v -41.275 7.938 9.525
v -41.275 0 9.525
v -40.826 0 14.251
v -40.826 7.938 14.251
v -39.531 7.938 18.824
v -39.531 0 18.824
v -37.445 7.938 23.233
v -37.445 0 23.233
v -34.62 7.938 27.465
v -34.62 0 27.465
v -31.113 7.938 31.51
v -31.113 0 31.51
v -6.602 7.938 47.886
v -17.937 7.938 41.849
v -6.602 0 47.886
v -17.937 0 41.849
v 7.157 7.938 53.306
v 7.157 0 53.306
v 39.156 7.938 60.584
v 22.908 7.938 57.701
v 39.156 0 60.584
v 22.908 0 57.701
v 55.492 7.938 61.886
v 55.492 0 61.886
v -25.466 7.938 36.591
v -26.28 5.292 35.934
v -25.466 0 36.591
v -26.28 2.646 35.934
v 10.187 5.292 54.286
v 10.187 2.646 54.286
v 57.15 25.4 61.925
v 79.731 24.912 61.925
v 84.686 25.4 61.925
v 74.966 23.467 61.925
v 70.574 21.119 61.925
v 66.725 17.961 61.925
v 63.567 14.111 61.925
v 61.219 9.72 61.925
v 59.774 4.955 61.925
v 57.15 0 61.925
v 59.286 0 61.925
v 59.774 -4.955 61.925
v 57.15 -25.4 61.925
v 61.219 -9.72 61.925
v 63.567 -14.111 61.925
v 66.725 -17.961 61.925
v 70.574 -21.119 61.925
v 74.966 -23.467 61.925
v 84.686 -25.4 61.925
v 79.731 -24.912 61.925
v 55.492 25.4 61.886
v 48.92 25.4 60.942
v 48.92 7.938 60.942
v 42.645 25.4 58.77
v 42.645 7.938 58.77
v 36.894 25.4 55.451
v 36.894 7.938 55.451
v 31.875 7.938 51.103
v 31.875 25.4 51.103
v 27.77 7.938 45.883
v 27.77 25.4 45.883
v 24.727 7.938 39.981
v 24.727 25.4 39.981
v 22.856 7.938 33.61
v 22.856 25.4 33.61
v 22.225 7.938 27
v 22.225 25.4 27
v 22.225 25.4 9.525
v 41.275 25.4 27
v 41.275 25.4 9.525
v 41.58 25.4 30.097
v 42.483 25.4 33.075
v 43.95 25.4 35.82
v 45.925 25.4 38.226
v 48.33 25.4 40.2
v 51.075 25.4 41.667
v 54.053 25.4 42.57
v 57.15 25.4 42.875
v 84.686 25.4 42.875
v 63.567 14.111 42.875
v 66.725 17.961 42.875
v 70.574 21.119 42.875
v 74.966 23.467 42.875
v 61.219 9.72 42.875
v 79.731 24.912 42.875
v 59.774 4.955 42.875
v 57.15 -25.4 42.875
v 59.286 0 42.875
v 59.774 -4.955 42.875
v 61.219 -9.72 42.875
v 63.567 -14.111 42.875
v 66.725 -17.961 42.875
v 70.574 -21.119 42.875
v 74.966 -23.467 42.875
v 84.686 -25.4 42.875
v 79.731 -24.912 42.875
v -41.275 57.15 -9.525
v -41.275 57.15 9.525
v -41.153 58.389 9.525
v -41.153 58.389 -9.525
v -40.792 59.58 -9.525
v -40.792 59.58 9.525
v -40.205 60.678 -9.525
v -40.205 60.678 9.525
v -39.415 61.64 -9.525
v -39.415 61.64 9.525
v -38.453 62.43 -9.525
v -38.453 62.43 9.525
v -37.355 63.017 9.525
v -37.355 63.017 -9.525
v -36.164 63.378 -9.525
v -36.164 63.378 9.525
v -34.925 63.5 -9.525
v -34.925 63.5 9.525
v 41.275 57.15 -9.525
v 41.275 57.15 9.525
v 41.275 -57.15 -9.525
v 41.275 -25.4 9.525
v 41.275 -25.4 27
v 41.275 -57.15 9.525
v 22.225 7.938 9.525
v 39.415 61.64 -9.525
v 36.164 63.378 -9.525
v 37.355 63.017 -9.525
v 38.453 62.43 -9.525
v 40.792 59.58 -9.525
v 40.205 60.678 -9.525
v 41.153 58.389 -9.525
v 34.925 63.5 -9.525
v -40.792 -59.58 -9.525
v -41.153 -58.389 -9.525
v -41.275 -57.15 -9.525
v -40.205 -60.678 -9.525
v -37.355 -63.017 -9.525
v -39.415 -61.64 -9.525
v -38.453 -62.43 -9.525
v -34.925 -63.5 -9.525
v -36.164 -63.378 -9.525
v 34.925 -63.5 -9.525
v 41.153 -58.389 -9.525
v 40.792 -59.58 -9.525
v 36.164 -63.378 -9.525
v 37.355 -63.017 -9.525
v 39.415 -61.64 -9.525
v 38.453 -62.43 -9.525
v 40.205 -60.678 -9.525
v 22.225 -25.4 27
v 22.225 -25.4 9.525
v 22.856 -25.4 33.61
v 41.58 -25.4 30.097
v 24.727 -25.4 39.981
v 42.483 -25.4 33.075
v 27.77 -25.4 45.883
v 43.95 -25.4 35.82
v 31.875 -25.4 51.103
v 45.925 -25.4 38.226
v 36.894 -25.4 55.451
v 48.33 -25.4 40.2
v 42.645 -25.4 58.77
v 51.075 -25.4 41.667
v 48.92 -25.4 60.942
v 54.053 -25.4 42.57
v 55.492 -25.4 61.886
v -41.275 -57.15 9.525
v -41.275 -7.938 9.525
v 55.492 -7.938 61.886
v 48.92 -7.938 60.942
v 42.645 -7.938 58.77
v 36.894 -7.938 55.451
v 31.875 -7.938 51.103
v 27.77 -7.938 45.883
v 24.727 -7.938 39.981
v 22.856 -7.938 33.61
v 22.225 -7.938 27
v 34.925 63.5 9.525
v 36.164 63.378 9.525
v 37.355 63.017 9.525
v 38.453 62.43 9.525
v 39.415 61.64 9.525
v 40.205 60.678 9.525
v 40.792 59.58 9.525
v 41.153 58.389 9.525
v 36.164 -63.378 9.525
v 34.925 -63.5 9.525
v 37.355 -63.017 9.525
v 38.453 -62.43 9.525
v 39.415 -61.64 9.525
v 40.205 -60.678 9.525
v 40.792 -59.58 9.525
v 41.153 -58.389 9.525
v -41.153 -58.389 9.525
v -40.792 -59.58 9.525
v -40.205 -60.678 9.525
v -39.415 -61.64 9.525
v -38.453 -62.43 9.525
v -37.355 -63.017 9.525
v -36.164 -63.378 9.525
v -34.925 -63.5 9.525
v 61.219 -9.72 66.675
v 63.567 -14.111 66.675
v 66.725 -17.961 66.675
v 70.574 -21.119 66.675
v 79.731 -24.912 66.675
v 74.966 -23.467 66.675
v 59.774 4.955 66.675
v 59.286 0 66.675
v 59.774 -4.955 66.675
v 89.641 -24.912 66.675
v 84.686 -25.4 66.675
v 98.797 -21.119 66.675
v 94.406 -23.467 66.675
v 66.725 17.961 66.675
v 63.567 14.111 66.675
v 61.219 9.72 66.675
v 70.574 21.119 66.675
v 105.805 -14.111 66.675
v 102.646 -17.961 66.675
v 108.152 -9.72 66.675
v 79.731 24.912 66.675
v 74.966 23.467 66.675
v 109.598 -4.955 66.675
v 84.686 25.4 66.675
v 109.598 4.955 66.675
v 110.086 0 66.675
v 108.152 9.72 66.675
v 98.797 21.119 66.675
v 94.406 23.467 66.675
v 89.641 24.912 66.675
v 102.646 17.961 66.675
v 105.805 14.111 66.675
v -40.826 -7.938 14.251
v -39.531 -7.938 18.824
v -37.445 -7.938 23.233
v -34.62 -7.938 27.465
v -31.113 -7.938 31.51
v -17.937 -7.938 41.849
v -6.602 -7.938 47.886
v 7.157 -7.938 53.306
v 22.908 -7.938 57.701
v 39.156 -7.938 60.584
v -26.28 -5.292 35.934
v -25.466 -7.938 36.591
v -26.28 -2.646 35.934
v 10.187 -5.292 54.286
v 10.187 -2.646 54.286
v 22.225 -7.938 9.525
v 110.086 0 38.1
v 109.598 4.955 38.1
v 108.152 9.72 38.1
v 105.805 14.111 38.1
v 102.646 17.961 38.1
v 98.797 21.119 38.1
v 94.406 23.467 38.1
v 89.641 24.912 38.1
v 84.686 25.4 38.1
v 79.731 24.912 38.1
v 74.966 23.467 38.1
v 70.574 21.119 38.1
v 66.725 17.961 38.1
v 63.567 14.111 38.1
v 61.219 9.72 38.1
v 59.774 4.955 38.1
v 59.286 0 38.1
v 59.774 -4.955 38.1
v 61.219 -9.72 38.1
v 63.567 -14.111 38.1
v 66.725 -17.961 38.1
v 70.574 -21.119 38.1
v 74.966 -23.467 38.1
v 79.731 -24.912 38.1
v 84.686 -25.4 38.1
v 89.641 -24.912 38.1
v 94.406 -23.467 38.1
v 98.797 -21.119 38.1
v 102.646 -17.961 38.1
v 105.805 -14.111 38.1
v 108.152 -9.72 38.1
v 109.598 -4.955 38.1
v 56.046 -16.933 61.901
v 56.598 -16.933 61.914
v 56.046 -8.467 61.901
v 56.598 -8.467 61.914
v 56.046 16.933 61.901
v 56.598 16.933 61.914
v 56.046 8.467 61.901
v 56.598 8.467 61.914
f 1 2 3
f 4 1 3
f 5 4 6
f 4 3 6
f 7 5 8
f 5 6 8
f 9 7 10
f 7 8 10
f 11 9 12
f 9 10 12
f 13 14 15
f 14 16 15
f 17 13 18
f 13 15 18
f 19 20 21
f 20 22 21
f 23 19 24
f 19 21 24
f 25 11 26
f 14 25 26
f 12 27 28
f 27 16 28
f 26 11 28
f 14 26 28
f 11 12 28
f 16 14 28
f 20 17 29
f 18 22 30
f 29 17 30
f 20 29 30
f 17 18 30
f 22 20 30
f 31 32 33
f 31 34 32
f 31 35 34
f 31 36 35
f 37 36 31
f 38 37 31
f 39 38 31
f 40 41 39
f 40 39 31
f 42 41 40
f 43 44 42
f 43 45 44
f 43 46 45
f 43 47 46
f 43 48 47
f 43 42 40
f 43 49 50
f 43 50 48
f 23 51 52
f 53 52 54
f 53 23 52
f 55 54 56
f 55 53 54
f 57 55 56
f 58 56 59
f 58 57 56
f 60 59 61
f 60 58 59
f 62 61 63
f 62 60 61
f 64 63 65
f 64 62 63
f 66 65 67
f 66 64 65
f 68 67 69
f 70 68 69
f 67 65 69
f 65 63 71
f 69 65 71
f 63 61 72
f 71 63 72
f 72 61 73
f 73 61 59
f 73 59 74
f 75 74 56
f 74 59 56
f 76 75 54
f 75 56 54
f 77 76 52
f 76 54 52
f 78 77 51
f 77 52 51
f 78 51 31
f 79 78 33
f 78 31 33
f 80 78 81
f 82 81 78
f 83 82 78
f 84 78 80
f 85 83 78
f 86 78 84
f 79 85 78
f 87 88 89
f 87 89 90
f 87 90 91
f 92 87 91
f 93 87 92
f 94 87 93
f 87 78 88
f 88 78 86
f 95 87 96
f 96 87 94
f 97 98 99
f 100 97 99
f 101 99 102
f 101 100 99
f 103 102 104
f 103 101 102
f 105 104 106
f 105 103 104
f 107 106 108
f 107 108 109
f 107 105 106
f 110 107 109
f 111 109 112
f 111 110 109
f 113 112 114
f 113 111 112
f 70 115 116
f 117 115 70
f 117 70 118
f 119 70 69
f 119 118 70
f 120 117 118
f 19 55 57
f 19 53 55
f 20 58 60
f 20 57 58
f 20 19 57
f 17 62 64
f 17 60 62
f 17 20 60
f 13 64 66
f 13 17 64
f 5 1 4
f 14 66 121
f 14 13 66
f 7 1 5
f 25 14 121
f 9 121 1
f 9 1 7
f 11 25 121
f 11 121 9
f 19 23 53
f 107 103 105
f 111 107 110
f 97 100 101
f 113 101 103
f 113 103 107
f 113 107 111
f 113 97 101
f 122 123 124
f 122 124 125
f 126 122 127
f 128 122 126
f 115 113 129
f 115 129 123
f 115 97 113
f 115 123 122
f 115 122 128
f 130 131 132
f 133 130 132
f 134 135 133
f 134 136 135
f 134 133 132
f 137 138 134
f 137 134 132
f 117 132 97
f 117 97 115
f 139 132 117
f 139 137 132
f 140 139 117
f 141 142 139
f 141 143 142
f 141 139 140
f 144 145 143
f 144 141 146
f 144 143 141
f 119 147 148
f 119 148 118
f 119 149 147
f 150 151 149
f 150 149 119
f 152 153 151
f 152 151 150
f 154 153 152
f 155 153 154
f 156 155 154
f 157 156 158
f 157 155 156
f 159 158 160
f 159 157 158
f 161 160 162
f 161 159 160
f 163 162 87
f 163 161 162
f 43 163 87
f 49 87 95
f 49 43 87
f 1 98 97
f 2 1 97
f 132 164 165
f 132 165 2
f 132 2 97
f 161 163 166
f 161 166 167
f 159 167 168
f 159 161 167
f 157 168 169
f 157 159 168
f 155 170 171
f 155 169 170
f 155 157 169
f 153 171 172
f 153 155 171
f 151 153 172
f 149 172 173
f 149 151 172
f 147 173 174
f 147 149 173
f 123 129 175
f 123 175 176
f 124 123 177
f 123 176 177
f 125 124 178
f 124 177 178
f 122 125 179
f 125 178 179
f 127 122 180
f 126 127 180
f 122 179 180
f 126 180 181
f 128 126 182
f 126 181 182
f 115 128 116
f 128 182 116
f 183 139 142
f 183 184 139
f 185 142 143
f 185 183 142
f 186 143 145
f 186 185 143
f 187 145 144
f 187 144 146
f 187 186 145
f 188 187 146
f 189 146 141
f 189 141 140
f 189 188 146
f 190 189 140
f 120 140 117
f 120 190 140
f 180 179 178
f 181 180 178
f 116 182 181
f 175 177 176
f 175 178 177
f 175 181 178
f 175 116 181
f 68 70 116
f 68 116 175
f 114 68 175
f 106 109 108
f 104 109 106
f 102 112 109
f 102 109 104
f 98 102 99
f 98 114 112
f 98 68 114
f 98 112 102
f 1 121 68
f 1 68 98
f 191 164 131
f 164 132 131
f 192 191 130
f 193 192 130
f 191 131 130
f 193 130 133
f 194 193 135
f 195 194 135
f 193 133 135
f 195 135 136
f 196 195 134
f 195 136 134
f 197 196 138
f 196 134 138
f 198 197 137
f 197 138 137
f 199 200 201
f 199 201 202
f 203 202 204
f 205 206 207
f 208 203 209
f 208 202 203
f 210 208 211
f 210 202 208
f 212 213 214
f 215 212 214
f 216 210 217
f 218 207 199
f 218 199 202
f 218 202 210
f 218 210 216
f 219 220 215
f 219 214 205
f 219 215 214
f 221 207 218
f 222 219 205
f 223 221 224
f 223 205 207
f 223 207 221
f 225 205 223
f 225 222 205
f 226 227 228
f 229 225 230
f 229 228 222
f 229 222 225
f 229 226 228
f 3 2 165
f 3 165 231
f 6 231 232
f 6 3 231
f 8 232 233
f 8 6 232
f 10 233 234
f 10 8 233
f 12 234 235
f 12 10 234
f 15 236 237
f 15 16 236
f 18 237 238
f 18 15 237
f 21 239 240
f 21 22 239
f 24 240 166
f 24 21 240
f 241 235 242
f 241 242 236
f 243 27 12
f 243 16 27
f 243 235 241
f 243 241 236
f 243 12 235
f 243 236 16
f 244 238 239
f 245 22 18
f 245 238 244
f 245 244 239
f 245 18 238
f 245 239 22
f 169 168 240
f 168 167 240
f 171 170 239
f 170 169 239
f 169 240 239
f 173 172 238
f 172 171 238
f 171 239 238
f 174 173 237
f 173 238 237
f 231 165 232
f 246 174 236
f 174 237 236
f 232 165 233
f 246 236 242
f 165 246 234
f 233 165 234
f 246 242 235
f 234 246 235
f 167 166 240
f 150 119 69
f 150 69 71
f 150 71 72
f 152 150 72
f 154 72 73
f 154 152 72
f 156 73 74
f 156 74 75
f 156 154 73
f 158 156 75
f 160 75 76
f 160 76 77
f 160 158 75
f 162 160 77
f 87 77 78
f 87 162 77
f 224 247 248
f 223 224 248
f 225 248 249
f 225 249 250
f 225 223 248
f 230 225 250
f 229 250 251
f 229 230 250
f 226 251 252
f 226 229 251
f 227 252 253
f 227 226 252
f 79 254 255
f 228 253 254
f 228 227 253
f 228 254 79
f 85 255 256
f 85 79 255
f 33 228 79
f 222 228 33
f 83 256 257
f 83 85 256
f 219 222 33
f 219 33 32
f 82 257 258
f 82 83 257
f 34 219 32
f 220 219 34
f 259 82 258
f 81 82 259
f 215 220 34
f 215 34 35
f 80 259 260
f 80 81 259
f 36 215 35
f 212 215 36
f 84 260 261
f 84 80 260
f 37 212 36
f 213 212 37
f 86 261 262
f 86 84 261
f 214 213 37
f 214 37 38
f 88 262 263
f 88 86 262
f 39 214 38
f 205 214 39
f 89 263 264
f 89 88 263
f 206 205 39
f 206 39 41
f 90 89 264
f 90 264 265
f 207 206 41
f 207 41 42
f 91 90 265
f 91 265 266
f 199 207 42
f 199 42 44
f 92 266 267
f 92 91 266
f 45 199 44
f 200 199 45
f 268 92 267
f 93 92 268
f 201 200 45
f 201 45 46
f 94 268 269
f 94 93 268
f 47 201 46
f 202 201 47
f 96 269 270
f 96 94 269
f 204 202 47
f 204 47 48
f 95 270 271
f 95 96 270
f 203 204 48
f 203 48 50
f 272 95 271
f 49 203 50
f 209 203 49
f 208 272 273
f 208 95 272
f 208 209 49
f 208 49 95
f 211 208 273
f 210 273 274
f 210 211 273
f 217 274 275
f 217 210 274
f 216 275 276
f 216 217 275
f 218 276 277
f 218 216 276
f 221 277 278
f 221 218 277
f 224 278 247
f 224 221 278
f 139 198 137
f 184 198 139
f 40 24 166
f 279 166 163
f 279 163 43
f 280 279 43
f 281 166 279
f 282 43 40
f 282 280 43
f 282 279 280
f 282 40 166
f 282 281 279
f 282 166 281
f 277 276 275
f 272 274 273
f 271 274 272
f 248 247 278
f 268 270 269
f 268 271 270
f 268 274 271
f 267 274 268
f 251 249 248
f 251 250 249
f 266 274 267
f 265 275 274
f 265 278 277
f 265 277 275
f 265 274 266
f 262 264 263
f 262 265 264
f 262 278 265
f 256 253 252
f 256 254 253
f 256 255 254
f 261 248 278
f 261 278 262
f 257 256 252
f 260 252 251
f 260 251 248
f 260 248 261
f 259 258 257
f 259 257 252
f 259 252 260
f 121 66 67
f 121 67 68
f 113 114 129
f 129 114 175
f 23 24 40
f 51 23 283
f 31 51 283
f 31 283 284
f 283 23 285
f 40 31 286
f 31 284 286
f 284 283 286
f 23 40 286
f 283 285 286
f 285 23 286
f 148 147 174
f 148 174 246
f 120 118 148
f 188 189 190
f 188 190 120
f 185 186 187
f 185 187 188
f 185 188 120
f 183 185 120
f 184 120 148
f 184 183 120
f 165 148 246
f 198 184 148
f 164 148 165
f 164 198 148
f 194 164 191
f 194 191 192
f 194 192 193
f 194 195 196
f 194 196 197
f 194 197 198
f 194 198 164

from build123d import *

# Parameters (mm, degrees)
F1_DEPTH = 63.5
F2_DEPTH = 7.9375
F3_R     = 6.35
F0_W     = 25.4
F0_H     = 19.05
F4_DEPTH = 25.4


with BuildPart() as f1:
    # F0 (on Front) → F1 (new body, symmetric)
    with BuildSketch(Plane.XZ):
        Polygon((22.225, 9.525), (-41.275, 9.525), (-41.275, -9.525), (41.275, -9.525), (41.275, 9.525), align=None)
    extrude(amount=F1_DEPTH, both=True)

    # F0 (on Front) → F2 (join, symmetric)
    with BuildSketch(Plane.XZ):
        with BuildLine():
            add(Edge.make_bspline(
                [(-41.275, 9.525), (-41.2262459326, 39.0642297135), (9.9785681568, 60.561025247), (55.4924441738, 61.8858436616)],
                knots=[0, 0, 0, 0, 110.1650615003, 110.1650615003, 110.1650615003, 110.1650615003], degree=3))
            Line((-41.275, 9.525), (22.225, 9.525))
            Line((22.225, 9.525), (22.225, 27.0002))
            ThreePointArc((22.225, 27.0002), (31.8750542807, 51.1027464191), (55.4924441738, 61.8858436616))
        make_face()
    extrude(amount=F2_DEPTH, both=True)

    # F3
    f3_edges = [f1.edges().sort_by_distance(p)[0] for p in [
        (-41.275, -63.5, 0),
        (41.275, -63.5, 0),
        (41.275, 63.5, 0),
        (-41.275, 63.5, 0),
    ]]
    fillet(f3_edges, radius=F3_R)

    # F0 (on Front) → F4 (join, symmetric)
    with BuildSketch(Plane.XZ):
        with BuildLine():
            Line((22.225, 27.0002), (22.225, 9.525))
            Line((22.225, 9.525), (41.275, 9.525))
            Line((41.275, 9.525), (41.275, 27.0002))
            ThreePointArc((41.275, 27.0002), (45.9246798487, 38.2255201513), (57.15, 42.8752))
            Line((57.15, 42.8752), (59.2859117566, 42.8752))
            Line((59.2859117566, 42.8752), (59.2859117566, 61.9252))
            Line((59.2859117566, 61.9252), (57.15, 61.9252))
            add(Edge.make_bspline(
                [(55.4924441738, 61.8858436616), (56.0458381711, 61.9019518603), (56.5983908409, 61.9150779074), (57.15, 61.9252)],
                knots=[110.1650615003, 110.1650615003, 110.1650615003, 110.1650615003, 111.5045361635, 111.5045361635, 111.5045361635, 111.5045361635], degree=3))
            ThreePointArc((55.4924441738, 61.8858436616), (31.8750542807, 51.1027464191), (22.225, 27.0002))
        make_face()
        with Locations((71.9859117566, 52.4002)):
            Rectangle(F0_W, F0_H)
    extrude(amount=F4_DEPTH, both=True)

    # F0 (on Front) → F5 (revolve)
    with BuildSketch(Plane.XZ):
        Polygon((84.6859117566, 66.675), (84.6859117566, 61.9252), (84.6859117566, 42.8752), (84.6859117566, 38.1), (110.0859117566, 38.1), (110.0859117566, 66.675), align=None)
    revolve(axis=Axis((84.6859117566, 0, 52.3875), (0, 0, 1)))


solid = f1.part
